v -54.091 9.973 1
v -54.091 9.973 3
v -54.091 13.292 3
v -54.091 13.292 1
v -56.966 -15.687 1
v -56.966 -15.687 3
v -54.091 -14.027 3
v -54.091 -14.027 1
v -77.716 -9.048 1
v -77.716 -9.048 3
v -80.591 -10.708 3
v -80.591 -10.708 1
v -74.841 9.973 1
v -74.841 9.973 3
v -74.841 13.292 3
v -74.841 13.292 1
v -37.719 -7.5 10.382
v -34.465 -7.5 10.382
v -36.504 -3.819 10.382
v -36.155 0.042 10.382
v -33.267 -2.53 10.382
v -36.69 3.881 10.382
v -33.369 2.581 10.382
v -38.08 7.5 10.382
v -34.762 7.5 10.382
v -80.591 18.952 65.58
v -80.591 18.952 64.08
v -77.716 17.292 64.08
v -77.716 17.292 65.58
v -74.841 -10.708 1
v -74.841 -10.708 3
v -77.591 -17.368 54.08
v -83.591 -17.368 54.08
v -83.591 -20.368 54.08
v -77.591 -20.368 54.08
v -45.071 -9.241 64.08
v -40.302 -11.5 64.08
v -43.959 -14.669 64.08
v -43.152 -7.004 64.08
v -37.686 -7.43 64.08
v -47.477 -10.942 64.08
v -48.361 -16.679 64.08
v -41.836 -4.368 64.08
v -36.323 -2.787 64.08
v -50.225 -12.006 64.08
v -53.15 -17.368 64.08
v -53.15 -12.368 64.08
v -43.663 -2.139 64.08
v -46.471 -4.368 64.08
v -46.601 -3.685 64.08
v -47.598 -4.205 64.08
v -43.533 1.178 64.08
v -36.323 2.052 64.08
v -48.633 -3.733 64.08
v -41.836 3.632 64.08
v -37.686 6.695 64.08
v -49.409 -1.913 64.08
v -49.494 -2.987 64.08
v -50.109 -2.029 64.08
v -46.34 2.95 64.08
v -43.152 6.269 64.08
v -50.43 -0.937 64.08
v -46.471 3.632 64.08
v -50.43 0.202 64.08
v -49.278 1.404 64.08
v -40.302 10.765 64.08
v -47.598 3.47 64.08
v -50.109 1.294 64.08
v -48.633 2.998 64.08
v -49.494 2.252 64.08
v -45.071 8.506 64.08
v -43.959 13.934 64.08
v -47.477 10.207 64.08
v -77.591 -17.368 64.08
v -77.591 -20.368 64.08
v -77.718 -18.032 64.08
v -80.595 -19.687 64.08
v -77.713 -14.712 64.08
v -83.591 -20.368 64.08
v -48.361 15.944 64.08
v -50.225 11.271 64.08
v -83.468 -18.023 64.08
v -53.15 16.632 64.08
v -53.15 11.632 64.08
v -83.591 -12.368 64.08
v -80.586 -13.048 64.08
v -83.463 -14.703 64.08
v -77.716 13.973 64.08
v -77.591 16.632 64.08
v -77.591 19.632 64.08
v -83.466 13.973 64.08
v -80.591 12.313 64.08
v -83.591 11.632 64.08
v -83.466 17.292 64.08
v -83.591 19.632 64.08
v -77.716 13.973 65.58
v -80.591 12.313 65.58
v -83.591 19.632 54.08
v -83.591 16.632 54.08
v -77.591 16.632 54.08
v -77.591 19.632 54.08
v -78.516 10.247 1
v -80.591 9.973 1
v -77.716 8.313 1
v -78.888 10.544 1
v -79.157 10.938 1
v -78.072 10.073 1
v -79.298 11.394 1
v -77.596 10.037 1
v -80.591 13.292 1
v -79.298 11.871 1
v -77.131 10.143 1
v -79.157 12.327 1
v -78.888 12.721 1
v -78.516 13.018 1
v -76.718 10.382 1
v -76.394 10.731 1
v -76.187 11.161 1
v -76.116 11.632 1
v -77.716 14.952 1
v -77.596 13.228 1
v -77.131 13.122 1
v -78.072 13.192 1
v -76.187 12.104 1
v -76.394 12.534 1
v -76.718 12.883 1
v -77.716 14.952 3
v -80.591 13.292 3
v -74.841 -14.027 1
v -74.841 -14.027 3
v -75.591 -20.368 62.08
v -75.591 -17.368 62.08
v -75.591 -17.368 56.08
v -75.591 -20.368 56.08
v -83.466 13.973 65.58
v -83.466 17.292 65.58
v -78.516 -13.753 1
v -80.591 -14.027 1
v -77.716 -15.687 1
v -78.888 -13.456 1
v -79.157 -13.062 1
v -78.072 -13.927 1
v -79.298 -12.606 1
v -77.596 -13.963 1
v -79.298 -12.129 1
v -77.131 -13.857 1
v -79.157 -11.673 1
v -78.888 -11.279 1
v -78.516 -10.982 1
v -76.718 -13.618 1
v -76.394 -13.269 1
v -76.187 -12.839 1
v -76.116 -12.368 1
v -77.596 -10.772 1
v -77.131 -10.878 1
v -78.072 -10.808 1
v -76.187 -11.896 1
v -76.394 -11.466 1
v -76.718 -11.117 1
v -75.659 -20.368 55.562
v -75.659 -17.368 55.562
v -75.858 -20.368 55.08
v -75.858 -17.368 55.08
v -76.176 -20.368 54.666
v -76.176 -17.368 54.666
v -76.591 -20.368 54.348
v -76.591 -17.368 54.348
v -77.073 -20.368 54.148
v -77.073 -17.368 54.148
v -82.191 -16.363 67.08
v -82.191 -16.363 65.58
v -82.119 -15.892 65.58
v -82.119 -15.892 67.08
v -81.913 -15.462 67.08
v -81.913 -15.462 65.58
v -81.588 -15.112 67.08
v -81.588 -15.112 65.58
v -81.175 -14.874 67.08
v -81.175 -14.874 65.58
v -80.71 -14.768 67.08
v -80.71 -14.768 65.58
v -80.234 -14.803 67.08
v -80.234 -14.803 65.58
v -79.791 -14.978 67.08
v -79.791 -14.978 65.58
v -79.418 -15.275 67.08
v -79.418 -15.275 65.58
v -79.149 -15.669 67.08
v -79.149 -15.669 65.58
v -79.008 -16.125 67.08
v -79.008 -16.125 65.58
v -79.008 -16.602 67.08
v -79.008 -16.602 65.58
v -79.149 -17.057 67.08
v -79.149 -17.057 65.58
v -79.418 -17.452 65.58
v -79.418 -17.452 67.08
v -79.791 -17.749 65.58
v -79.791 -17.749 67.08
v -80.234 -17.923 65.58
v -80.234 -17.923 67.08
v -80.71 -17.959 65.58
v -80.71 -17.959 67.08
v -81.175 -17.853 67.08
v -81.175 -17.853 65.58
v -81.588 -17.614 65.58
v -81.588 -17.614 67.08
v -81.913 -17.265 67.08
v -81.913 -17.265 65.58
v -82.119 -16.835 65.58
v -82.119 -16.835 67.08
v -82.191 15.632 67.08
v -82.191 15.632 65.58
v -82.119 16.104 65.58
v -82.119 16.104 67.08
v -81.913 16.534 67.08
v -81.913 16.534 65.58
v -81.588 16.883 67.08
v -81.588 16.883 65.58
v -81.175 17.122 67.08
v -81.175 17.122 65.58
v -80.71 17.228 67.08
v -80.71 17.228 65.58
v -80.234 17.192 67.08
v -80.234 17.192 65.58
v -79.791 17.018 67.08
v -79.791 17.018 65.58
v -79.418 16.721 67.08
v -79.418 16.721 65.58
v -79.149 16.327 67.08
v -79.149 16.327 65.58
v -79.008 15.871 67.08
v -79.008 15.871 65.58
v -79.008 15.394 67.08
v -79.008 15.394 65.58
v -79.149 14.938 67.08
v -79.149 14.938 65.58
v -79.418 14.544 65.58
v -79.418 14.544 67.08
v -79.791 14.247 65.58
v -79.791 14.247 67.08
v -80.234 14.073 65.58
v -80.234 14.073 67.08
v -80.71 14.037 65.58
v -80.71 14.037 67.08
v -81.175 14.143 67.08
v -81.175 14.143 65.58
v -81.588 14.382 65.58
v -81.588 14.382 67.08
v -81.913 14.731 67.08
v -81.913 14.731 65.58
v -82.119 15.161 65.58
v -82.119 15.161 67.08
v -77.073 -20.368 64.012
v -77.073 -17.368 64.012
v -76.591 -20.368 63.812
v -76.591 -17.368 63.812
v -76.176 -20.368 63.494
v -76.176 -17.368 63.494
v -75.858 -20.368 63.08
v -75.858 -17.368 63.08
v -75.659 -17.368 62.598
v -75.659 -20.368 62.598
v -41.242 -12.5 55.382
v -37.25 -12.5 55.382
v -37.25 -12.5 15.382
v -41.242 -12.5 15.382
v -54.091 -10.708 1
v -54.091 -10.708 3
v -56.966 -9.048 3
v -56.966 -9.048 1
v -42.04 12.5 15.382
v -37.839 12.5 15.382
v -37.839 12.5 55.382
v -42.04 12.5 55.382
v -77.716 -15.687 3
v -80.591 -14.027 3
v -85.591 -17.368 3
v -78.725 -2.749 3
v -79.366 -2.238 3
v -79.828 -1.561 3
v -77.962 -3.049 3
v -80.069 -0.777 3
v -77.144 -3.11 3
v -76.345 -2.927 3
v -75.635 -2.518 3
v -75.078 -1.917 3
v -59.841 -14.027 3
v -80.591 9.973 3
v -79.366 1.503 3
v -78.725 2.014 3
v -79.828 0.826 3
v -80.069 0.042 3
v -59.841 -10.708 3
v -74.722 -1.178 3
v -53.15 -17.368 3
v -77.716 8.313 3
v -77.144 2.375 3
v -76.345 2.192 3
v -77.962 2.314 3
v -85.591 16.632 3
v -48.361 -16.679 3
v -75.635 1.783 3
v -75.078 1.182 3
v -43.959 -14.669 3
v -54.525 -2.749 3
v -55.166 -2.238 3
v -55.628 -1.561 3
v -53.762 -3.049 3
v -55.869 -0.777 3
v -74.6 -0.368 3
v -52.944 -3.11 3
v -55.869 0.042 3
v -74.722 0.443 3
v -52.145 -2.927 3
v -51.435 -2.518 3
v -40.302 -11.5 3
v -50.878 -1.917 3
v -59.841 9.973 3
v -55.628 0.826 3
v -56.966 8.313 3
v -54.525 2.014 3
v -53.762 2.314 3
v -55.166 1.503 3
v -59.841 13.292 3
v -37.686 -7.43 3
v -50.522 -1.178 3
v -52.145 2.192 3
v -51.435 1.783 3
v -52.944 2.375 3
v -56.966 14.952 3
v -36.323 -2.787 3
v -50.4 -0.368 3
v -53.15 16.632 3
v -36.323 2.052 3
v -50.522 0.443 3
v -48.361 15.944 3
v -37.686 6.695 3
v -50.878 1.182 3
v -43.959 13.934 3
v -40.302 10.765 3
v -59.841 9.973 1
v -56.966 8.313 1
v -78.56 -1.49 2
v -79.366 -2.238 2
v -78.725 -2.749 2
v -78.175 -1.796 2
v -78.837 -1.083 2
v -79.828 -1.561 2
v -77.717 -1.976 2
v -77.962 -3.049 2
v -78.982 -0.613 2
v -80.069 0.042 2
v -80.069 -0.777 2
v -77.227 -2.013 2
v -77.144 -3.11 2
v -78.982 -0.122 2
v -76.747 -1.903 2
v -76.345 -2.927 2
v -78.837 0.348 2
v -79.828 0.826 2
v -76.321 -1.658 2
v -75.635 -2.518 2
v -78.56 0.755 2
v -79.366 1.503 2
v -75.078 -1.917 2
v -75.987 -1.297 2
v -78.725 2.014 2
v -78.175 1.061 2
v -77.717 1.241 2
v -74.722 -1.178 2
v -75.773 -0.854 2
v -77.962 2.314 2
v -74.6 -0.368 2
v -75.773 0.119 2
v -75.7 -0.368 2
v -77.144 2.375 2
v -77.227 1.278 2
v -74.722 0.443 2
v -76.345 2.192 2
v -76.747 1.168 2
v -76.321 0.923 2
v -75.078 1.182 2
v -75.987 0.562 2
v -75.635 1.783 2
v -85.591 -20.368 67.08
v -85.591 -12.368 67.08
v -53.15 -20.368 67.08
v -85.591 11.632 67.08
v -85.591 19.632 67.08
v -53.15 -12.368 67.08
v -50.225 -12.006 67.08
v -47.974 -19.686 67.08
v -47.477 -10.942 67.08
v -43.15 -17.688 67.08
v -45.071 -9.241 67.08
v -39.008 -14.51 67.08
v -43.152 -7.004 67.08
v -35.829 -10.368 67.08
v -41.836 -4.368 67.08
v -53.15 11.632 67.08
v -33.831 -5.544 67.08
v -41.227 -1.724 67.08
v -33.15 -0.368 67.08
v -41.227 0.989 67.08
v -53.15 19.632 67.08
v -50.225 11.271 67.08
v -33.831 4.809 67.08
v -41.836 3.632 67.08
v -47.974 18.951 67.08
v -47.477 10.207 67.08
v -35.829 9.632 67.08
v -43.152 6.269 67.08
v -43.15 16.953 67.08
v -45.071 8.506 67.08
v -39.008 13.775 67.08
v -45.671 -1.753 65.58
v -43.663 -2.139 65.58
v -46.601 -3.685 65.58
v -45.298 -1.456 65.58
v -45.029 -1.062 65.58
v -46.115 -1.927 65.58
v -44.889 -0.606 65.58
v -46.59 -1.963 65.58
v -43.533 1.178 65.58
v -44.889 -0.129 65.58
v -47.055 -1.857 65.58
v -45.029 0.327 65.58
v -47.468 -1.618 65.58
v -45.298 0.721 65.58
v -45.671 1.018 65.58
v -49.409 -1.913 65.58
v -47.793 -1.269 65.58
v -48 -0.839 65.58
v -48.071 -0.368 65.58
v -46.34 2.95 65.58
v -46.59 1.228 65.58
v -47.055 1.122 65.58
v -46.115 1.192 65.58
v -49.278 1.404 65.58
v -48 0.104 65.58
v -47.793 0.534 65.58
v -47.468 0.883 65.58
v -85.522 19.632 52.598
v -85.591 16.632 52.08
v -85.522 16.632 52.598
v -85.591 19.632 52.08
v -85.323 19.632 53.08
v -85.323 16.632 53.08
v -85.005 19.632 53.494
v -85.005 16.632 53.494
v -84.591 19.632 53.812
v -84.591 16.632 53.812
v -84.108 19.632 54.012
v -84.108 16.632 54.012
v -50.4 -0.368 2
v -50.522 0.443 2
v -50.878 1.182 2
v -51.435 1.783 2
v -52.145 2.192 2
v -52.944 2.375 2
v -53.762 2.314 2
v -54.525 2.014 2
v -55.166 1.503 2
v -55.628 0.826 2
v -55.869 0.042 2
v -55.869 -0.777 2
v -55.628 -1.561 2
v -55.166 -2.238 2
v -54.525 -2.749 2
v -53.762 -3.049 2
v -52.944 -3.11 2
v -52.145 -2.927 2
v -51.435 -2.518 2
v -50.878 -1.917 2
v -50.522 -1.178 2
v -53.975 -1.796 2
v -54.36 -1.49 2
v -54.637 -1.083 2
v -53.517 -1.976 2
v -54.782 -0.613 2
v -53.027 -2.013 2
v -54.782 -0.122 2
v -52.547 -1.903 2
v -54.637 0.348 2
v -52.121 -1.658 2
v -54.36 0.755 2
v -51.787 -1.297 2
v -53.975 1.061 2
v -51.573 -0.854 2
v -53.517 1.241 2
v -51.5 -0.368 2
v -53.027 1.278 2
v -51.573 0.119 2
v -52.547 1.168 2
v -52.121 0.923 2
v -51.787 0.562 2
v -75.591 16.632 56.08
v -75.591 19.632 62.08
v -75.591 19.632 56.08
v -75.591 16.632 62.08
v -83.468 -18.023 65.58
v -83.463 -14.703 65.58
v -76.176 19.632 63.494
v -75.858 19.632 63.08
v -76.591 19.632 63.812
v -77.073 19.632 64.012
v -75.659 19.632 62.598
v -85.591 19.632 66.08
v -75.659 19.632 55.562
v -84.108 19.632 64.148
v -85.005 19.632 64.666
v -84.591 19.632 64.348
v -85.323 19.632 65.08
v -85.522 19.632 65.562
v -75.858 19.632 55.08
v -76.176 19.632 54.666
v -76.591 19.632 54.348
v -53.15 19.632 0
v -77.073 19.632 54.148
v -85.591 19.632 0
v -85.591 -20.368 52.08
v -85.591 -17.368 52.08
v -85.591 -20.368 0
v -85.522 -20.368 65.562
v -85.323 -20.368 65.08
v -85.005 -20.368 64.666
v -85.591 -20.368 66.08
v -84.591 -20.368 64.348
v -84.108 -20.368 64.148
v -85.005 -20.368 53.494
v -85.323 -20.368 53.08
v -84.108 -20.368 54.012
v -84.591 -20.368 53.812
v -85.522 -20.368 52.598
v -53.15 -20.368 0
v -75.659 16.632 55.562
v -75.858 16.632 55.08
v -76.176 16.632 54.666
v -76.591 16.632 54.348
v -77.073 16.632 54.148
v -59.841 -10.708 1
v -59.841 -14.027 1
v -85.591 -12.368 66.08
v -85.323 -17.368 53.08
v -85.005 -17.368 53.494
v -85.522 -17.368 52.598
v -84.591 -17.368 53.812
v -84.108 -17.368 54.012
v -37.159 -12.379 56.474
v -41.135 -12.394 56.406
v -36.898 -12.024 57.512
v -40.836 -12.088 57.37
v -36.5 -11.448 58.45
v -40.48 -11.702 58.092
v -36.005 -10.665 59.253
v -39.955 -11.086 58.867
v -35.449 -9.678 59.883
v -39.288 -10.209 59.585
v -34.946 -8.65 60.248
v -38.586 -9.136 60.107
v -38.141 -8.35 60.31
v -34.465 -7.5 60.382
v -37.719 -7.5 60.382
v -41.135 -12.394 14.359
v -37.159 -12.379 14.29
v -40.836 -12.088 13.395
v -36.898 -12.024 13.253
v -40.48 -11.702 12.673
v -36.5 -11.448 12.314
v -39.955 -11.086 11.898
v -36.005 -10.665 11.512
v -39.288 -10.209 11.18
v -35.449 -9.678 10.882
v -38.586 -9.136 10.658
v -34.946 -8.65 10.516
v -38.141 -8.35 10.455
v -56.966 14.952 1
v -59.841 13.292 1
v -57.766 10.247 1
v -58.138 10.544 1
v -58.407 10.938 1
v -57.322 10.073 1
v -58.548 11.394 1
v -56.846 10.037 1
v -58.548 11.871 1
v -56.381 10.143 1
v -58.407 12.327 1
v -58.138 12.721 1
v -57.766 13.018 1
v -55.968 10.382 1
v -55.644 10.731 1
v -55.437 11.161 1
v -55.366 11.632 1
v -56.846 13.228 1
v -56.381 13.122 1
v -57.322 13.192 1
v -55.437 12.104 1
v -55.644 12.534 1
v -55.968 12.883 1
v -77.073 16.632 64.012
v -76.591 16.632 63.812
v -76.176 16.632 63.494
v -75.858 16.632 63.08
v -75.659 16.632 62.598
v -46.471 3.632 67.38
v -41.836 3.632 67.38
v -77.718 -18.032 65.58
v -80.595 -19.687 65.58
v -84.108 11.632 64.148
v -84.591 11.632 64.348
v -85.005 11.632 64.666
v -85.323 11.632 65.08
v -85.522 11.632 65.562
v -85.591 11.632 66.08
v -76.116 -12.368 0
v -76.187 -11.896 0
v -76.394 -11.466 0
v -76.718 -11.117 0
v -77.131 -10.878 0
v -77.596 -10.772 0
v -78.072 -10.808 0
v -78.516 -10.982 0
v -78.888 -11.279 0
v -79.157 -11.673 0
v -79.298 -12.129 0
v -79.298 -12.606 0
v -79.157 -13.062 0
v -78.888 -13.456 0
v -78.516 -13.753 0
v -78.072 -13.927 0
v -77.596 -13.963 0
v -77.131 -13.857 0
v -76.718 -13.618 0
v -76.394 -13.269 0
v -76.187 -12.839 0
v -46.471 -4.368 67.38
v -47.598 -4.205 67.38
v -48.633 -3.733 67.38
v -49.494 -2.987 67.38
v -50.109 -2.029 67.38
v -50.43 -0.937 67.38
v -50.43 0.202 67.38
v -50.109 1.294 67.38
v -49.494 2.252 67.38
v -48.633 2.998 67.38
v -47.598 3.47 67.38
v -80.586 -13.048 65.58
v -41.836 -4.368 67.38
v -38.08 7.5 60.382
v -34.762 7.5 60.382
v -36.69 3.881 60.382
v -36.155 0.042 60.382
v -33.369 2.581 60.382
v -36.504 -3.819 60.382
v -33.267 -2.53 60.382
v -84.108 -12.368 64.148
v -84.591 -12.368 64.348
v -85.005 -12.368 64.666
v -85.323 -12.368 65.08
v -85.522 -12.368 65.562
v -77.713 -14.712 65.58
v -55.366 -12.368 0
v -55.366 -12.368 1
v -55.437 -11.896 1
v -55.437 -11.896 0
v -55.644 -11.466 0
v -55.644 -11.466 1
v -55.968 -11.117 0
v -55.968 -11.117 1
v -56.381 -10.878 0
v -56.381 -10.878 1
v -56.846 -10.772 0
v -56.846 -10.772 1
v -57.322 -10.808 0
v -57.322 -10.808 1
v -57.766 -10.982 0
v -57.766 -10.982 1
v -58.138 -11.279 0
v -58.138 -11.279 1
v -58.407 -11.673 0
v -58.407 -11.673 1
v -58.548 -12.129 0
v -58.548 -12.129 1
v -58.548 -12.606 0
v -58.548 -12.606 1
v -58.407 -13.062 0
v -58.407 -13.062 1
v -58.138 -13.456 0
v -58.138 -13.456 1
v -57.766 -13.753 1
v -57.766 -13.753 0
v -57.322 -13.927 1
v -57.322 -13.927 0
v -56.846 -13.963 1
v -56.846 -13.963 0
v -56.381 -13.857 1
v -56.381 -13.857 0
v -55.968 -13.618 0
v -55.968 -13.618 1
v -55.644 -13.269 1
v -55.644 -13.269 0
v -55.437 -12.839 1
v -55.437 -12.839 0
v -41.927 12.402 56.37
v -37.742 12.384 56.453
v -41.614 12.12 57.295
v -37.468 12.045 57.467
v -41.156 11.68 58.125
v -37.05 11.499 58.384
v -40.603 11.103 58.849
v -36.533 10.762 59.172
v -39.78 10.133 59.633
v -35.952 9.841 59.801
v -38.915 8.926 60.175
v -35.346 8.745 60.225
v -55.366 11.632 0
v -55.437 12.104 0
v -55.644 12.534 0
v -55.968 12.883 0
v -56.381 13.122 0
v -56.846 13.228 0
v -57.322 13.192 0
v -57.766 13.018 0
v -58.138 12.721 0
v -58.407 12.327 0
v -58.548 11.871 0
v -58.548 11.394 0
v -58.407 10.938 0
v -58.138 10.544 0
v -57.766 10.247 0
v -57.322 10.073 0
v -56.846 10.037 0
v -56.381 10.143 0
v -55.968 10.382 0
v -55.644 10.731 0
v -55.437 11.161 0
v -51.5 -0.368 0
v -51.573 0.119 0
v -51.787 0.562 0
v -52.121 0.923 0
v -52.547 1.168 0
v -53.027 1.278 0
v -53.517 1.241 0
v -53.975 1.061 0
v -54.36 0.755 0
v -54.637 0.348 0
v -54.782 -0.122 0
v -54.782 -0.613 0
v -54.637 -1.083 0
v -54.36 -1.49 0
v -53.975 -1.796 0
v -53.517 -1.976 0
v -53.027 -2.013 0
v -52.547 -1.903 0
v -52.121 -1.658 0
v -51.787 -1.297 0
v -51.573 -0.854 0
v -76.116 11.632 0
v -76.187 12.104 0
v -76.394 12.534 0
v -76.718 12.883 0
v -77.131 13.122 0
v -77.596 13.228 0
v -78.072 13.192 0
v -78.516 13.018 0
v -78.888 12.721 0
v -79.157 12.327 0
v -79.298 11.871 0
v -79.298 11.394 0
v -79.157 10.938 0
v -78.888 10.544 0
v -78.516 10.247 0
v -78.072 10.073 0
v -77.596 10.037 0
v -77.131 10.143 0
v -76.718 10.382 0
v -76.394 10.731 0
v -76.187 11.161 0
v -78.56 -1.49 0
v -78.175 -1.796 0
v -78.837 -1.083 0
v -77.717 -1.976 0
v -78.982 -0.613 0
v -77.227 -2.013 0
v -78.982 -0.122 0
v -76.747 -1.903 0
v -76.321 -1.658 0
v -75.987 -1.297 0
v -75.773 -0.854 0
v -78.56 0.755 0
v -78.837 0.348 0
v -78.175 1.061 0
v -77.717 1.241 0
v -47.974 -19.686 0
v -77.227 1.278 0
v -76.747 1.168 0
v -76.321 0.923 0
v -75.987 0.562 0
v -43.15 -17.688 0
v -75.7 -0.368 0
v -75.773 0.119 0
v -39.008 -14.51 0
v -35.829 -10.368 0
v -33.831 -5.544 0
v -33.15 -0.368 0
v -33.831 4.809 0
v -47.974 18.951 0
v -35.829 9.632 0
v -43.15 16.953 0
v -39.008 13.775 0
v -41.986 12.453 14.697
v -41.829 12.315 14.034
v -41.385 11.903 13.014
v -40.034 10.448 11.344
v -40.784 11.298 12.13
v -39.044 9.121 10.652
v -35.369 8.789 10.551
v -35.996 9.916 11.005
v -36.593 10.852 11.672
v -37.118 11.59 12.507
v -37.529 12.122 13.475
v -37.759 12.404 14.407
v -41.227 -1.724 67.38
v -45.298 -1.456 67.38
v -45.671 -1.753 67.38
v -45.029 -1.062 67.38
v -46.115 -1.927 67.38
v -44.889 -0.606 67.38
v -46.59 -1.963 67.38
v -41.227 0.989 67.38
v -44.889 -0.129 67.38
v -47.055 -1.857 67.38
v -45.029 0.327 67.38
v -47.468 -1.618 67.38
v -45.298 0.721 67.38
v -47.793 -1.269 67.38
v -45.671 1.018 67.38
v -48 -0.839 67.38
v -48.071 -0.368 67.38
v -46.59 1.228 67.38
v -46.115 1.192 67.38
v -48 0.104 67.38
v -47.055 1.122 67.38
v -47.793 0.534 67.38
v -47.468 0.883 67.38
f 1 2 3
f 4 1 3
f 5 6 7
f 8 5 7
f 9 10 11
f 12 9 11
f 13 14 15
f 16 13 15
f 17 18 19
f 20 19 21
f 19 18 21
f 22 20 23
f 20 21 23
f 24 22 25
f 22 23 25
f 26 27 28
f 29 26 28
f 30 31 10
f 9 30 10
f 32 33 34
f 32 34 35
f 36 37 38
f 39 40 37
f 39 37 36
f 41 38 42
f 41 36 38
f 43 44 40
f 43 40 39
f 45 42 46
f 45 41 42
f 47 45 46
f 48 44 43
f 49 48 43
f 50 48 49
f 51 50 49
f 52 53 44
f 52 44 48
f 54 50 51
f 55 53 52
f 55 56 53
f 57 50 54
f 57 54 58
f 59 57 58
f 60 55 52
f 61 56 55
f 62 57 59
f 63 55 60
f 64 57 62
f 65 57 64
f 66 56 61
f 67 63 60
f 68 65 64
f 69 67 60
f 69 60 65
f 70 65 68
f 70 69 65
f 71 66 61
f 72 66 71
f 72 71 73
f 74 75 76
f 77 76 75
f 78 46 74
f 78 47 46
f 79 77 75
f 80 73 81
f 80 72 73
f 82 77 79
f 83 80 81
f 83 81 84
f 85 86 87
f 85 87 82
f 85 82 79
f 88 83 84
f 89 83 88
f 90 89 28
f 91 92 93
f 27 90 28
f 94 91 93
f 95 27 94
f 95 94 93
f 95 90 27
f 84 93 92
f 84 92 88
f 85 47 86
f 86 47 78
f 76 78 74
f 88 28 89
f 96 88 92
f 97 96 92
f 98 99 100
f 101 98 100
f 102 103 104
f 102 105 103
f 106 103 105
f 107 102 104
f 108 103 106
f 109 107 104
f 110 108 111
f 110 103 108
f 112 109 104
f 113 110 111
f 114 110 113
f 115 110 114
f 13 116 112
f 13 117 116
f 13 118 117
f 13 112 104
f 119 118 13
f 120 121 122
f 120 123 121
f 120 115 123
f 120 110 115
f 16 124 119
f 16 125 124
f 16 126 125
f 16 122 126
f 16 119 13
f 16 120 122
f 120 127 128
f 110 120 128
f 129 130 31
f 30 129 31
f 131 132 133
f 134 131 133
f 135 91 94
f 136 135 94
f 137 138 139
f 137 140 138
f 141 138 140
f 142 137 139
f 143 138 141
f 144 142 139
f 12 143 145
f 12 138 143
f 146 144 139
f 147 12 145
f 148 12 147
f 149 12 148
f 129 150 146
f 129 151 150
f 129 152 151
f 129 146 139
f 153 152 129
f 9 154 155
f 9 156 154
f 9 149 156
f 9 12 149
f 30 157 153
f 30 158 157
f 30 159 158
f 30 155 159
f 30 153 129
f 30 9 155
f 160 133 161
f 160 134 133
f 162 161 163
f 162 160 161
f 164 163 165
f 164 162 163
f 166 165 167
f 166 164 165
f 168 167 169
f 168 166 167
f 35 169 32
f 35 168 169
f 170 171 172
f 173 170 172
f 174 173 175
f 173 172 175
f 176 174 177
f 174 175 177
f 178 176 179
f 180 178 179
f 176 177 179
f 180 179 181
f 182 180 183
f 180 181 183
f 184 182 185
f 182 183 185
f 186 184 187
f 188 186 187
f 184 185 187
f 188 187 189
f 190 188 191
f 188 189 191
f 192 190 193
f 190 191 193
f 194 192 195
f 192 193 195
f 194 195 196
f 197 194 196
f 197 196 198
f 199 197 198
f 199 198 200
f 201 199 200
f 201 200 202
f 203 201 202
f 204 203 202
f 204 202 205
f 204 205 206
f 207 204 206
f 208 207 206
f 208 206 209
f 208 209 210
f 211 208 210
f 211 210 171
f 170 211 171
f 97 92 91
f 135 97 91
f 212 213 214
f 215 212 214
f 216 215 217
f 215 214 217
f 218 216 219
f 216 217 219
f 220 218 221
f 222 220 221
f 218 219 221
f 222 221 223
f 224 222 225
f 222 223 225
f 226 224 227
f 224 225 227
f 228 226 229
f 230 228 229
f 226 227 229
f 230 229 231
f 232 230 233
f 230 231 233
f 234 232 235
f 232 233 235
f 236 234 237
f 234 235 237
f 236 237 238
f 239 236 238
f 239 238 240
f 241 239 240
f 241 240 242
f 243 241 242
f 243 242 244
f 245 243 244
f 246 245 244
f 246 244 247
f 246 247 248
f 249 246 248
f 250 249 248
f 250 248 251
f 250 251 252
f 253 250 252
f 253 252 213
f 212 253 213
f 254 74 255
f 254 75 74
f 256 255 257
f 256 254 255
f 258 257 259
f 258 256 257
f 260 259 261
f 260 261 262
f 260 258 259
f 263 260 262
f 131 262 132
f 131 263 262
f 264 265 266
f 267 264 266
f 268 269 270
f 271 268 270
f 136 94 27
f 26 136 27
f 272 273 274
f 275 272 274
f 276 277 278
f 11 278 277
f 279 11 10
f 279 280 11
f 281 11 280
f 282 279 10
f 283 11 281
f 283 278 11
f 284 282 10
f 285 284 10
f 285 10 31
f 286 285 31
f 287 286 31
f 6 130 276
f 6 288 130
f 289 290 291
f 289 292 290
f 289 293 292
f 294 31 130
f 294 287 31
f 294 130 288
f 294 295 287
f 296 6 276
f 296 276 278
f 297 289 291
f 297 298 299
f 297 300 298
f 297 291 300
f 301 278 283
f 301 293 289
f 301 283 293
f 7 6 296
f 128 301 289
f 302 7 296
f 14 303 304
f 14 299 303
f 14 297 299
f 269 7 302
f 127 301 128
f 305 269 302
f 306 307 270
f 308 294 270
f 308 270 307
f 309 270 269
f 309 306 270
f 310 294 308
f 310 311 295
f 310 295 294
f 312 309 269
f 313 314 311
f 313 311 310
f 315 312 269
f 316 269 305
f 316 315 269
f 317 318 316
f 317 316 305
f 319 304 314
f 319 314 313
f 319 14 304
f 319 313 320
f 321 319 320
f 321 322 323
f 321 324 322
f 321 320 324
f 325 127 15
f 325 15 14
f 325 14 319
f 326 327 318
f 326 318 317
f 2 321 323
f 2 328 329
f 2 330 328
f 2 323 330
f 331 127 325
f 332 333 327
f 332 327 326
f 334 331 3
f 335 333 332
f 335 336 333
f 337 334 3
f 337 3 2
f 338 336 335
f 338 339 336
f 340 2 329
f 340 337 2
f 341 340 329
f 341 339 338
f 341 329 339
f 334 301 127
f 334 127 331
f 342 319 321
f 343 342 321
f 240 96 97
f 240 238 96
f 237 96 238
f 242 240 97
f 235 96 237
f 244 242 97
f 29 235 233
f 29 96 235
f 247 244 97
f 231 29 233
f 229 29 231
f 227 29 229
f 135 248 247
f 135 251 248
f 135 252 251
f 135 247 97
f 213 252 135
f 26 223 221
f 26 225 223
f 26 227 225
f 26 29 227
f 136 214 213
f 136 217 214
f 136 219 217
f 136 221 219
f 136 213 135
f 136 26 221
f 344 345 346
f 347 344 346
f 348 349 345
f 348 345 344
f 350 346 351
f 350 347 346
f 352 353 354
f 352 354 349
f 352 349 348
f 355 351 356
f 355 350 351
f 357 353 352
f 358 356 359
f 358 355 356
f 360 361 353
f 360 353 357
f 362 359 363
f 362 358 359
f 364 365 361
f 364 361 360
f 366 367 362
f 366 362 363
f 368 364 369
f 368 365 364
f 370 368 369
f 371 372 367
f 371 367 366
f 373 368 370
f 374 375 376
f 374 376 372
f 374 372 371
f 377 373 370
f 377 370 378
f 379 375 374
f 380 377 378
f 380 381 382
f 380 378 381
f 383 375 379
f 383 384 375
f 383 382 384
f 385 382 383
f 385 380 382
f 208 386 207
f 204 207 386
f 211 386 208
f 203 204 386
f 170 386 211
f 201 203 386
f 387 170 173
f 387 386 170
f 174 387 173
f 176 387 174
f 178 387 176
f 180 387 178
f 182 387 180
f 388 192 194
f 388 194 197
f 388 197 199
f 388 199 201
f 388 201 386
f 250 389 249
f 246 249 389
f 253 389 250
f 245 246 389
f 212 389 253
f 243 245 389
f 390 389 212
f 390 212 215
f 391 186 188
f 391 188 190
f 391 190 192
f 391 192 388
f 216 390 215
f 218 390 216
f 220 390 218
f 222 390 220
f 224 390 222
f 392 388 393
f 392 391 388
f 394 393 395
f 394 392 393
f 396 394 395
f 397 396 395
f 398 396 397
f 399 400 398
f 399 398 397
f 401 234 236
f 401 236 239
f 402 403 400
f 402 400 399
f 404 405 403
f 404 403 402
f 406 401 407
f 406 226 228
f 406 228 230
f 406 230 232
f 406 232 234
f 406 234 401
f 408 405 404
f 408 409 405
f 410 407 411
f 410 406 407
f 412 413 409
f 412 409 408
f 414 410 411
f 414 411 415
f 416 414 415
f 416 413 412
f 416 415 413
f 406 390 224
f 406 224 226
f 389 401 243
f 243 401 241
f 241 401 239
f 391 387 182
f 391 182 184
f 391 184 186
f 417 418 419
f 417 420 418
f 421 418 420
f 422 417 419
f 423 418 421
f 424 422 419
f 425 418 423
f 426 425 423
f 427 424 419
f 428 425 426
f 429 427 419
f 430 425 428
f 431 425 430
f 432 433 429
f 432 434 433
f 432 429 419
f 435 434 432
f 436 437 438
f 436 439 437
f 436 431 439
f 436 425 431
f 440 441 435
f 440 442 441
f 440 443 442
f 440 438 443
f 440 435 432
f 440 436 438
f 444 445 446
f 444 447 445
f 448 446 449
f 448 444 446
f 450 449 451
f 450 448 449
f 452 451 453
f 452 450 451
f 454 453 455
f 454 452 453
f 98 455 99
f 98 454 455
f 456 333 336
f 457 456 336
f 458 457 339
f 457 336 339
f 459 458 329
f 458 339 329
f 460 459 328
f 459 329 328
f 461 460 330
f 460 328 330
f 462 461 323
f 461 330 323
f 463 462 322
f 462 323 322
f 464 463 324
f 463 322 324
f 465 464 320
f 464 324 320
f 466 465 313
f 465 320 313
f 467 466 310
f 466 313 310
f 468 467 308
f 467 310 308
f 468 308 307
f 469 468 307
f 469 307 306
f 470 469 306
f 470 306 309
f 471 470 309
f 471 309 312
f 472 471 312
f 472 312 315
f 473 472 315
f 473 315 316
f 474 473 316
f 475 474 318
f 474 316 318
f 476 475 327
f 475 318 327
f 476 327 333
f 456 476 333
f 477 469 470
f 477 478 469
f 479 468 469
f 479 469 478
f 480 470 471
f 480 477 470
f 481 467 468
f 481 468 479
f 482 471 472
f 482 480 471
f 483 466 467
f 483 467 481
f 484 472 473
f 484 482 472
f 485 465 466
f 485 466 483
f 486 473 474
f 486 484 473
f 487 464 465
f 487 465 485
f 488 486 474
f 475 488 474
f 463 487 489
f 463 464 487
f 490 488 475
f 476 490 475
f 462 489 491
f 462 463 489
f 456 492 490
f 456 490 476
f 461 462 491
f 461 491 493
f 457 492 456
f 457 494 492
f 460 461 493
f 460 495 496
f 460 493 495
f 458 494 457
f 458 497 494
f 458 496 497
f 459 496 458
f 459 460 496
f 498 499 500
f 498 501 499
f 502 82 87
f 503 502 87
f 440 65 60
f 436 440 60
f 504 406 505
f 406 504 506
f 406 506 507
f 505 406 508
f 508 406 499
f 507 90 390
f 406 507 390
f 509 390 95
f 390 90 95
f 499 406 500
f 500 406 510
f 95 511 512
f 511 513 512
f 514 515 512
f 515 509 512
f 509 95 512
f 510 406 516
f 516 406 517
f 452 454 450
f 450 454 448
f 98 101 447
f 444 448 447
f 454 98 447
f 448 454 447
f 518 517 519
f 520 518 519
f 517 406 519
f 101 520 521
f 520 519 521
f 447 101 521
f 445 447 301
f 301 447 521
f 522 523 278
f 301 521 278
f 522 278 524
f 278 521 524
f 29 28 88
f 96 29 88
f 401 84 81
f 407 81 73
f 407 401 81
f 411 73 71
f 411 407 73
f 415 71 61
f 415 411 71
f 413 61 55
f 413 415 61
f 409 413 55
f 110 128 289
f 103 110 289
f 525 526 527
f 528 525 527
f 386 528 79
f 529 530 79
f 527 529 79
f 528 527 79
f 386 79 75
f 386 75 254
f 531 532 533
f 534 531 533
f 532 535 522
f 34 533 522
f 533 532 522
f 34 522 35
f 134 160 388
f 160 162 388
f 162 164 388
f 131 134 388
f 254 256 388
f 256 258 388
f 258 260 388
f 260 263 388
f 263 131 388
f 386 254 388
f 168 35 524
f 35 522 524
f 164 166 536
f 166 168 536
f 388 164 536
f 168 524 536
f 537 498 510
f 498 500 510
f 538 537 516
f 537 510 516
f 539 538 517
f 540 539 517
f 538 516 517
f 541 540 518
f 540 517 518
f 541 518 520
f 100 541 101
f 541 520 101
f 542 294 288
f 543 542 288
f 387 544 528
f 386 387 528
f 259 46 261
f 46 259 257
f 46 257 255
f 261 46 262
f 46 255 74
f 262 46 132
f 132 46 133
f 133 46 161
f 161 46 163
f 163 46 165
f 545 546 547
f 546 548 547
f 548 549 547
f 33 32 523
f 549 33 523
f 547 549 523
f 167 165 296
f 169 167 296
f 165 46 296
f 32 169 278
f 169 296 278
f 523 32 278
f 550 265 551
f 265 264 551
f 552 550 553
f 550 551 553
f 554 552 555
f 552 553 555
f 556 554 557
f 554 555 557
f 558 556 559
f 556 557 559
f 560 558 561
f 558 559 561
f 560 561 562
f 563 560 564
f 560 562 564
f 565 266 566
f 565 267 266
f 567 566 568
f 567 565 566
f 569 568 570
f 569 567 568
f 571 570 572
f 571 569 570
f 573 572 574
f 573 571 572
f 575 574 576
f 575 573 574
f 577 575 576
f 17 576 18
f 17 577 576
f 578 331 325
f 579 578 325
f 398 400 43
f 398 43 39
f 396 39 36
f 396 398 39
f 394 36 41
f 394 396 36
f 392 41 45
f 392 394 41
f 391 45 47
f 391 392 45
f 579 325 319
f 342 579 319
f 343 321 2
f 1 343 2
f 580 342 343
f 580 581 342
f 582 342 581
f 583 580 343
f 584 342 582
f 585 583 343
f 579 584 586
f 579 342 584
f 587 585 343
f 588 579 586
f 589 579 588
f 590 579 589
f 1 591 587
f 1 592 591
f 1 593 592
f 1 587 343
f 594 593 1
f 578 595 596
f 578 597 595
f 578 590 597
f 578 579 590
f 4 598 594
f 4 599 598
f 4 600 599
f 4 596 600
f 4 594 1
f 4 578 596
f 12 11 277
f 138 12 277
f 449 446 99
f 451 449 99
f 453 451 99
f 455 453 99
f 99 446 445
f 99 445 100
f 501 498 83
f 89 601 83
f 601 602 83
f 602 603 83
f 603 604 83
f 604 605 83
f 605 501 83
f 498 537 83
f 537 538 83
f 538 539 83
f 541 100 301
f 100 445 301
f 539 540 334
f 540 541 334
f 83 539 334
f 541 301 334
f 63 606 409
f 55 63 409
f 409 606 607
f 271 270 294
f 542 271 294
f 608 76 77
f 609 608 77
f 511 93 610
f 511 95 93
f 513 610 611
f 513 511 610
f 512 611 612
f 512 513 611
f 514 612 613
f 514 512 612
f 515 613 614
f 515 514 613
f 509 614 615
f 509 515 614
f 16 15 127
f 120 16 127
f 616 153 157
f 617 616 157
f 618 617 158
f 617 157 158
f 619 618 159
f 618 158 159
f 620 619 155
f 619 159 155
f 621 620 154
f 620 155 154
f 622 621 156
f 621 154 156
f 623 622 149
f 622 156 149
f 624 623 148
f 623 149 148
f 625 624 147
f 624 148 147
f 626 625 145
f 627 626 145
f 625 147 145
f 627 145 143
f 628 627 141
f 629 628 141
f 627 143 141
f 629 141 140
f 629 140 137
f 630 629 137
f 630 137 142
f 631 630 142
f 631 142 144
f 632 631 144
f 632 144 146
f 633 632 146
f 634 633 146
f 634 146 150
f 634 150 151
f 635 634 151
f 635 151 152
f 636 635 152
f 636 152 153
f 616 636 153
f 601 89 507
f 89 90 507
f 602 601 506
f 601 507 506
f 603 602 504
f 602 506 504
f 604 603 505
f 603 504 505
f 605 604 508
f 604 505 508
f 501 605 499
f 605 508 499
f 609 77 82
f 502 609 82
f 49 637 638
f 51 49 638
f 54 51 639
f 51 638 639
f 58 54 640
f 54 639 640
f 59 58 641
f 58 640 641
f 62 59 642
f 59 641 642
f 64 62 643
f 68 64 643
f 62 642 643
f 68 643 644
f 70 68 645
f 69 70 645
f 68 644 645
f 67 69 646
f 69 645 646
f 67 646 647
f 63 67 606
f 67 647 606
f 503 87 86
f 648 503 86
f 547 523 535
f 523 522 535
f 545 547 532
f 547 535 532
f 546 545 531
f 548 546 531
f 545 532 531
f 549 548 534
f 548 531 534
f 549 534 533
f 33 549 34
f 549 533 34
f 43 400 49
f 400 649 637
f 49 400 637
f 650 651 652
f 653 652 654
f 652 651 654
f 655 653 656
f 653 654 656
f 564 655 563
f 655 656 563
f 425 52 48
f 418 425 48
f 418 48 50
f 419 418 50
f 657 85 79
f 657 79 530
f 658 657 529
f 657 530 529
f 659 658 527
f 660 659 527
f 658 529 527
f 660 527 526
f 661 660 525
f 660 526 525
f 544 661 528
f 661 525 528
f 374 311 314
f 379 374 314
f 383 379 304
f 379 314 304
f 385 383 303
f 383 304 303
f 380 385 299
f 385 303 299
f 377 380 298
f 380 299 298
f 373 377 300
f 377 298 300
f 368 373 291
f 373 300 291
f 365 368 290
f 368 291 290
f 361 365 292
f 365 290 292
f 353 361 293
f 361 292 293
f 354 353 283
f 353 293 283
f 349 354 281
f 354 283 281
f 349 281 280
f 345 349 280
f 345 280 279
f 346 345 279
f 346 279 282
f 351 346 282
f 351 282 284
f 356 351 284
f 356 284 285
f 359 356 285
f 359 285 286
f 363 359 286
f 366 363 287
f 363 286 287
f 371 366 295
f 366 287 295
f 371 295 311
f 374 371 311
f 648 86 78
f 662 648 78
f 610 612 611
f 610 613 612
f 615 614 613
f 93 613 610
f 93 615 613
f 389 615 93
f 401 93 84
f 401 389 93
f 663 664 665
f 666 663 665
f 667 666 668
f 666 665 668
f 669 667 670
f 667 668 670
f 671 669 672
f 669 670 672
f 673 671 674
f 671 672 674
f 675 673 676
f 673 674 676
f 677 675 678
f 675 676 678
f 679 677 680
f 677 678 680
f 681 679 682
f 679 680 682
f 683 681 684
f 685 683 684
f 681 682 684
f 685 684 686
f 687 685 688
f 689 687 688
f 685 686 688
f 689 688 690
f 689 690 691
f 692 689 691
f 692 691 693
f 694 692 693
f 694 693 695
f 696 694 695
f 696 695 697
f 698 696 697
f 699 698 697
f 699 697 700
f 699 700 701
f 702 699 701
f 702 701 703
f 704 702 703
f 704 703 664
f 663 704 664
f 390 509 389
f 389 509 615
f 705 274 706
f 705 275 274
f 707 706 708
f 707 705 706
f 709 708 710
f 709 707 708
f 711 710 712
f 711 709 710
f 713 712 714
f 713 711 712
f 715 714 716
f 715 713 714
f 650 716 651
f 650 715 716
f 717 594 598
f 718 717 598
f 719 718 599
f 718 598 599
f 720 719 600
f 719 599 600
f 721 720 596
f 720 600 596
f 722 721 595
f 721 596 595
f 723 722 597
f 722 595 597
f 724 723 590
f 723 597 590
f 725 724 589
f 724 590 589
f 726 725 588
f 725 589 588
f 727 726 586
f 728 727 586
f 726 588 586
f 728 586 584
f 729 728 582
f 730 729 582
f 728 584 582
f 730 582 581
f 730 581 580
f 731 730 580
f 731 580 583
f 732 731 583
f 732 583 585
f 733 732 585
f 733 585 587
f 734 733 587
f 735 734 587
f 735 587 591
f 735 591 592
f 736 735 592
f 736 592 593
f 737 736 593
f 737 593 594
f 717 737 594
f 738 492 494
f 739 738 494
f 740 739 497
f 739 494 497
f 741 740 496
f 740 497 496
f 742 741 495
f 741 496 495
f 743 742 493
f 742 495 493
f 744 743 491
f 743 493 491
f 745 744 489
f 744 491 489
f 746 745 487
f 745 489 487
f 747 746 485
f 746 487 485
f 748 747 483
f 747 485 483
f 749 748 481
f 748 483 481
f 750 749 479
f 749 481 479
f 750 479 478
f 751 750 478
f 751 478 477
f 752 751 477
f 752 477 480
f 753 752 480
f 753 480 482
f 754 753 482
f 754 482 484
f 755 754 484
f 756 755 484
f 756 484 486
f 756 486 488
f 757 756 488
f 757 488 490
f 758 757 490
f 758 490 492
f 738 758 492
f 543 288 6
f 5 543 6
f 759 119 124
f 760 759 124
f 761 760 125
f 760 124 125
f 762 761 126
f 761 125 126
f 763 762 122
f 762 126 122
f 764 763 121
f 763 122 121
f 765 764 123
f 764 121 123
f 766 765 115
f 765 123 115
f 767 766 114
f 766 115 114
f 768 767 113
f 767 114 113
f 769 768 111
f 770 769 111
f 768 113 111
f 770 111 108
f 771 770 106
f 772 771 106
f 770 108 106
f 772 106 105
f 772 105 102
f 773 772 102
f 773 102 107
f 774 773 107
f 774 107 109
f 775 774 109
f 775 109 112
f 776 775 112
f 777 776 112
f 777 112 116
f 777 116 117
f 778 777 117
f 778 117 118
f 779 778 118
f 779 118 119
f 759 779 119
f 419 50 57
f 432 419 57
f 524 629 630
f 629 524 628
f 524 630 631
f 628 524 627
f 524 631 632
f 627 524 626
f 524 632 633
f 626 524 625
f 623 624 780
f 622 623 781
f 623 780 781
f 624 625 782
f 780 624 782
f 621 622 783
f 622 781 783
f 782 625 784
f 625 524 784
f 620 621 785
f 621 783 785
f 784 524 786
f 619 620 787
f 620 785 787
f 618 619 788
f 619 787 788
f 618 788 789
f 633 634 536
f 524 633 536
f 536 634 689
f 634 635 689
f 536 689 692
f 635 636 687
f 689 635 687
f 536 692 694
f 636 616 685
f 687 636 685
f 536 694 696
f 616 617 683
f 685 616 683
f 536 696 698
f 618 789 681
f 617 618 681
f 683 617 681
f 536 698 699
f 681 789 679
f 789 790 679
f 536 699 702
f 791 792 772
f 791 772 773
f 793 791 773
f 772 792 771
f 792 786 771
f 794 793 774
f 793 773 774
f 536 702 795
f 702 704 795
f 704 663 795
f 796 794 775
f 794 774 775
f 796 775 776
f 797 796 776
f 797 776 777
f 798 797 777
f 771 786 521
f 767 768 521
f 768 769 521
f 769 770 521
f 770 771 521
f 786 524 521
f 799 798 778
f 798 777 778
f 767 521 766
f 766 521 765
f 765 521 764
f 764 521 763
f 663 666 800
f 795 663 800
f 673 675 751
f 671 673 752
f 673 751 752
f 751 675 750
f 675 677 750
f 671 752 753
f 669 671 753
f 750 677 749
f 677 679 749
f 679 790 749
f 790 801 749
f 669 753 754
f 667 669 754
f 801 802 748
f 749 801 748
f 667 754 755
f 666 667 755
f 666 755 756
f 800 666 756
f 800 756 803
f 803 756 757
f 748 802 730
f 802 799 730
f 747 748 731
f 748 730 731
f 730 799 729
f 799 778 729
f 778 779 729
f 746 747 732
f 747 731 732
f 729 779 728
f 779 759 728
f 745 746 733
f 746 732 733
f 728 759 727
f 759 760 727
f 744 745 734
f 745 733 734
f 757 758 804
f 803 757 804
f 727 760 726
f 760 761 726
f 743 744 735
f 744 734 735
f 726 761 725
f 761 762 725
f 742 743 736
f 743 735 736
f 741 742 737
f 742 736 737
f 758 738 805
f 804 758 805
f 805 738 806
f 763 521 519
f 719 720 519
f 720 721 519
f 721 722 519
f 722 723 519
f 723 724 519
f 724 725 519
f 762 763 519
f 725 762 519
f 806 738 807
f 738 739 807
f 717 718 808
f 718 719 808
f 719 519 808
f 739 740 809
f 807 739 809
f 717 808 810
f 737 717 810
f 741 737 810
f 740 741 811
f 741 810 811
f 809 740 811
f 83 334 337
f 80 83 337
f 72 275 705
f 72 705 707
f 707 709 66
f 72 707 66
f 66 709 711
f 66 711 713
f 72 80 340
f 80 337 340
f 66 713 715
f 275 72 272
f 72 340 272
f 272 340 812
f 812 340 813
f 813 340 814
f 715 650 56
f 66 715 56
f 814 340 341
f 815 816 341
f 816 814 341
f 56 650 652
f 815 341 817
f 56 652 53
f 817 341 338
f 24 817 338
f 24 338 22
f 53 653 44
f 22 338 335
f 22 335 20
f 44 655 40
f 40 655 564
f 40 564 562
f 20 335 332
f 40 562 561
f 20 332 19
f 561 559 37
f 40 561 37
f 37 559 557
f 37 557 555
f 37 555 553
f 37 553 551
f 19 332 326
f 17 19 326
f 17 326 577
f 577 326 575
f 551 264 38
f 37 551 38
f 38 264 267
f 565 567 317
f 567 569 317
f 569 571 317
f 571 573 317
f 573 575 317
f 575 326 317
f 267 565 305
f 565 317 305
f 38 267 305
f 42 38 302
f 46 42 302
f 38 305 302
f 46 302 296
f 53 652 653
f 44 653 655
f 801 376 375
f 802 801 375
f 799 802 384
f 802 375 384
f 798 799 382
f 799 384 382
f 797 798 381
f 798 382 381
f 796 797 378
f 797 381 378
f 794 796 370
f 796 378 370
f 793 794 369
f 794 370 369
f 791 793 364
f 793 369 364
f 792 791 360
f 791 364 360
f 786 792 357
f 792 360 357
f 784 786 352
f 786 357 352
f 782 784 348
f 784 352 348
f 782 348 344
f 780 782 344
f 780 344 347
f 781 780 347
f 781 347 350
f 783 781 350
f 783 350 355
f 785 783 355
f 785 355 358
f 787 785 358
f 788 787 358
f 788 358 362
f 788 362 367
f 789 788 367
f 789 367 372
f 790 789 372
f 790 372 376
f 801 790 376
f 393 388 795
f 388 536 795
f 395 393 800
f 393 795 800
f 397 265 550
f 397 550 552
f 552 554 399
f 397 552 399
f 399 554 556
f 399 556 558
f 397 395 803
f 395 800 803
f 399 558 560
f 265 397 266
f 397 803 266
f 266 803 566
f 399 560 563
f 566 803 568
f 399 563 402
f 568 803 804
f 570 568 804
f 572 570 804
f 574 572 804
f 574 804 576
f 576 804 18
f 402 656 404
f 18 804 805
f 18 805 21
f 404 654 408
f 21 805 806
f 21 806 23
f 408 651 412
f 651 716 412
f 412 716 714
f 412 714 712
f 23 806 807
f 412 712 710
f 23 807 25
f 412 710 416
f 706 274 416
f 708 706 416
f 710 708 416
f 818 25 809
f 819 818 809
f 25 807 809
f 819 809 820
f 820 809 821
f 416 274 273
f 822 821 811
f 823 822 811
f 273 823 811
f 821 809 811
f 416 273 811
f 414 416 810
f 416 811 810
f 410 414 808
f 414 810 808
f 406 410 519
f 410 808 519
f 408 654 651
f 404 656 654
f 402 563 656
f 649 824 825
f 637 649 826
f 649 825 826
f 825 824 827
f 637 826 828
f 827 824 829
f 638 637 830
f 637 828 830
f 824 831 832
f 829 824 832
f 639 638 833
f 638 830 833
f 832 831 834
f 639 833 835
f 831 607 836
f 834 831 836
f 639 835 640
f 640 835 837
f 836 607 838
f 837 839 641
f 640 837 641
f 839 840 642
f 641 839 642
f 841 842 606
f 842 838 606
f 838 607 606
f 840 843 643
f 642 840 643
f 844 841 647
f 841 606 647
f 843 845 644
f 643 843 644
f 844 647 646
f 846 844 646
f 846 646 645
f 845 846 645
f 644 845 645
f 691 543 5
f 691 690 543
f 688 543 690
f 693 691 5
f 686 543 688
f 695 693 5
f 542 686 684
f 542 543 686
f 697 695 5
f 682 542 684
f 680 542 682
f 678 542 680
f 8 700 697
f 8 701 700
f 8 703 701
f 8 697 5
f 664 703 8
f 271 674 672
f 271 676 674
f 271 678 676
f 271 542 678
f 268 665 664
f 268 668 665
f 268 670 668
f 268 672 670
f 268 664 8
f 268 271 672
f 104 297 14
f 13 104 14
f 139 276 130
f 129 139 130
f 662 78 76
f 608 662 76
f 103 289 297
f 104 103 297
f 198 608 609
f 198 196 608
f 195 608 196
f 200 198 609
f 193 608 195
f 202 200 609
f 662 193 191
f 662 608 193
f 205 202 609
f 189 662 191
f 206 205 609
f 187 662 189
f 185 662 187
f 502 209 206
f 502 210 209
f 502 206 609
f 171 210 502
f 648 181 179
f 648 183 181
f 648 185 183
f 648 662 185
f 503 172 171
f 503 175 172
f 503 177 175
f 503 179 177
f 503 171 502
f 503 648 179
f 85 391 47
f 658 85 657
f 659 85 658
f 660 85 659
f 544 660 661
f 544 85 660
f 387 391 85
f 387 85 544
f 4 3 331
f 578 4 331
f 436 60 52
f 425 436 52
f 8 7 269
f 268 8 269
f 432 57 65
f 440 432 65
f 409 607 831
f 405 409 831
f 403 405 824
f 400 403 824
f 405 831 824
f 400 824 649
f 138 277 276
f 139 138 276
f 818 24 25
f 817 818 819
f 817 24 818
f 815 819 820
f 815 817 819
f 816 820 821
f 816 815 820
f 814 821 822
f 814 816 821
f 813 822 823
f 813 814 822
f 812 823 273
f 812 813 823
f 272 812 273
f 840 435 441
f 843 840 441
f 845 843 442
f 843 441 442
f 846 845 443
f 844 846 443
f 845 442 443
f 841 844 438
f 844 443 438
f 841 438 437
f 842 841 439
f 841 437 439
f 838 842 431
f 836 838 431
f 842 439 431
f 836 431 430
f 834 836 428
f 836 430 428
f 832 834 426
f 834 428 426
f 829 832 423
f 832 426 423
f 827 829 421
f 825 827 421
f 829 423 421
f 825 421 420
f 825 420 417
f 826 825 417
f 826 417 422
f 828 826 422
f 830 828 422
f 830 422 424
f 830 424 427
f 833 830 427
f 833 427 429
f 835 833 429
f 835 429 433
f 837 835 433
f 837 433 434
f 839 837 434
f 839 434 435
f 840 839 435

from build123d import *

# Parameters (mm, degrees)
BOSS_EXTRUDE1_DEPTH     = 3
BOSS_EXTRUDE2_DEPTH     = 64.08
BOSS_EXTRUDE3_START     = 0.3
BOSS_EXTRUDE3_DEPTH     = 3
CUT_EXTRUDE1_REACH      = 5
SKETCH4_R               = 1.65
CUT_EXTRUDE2_DEPTH      = 2
CUT_EXTRUDE3_REACH      = 5
SKETCH7_R               = 1.6
SKETCH10_W              = 10
SKETCH10_H              = 10
CUT_EXTRUDE4_DEPTH      = 38
CUT_EXTRUDE4_DEPTH_BACK = 4
CUT_EXTRUDE6_DEPTH      = 1.5
CUT_EXTRUDE7_REACH      = 5
SKETCH12_R              = 1.6
CUT_EXTRUDE8_REACH      = 87.591
BOSS_EXTRUDE4_DEPTH     = 3.3
CUT_EXTRUDE9_REACH      = 5.3
SKETCH15_R              = 1.6
CUT_EXTRUDE10_DEPTH     = 1.5
SKETCH17_R              = 8
CUT_EXTRUDE11_DEPTH     = 1
SKETCH18_R              = 2.75
CUT_EXTRUDE13_DEPTH     = 1
FILLET1_R               = 2
FILLET2_R               = 5


with BuildPart() as part:
    # Sketch1 → Boss-Extrude1 (new body)
    with BuildSketch(Plane.XY):
        with BuildLine():
            Line((-85.590530374, -20.367507575), (-53.15, -20.367507575))
            ThreePointArc((-53.15, -20.367507575), (-33.15, -0.367507575), (-53.15, 19.632492425))
            Line((-53.15, 19.632492425), (-85.590530374, 19.632492425))
            Line((-85.590530374, 19.632492425), (-85.590530374, -20.367507575))
        make_face()
    extrude(amount=BOSS_EXTRUDE1_DEPTH)

    # Sketch2 → Boss-Extrude2 (add)
    with BuildSketch(Plane.XY.offset(3)):
        with BuildLine():
            Line((-85.590530374, -20.367507575), (-53.15, -20.367507575))
            ThreePointArc((-53.15, -20.367507575), (-33.15, -0.367507575), (-53.15, 19.632492425))
            Line((-53.15, 19.632492425), (-85.590530374, 19.632492425))
            Line((-85.590530374, 19.632492425), (-85.590530374, 16.632492425))
            Line((-85.590530374, 16.632492425), (-53.15, 16.632492425))
            ThreePointArc((-53.15, 16.632492425), (-36.15, -0.367507575), (-53.15, -17.367507575))
            Line((-53.15, -17.367507575), (-85.590530374, -17.367507575))
            Line((-85.590530374, -17.367507575), (-85.590530374, -20.367507575))
        make_face()
    extrude(amount=BOSS_EXTRUDE2_DEPTH)

    # Sketch3 → Boss-Extrude3 (add)
    with BuildSketch(Plane(origin=(0, 0, 67.38), x_dir=(-1, 0, 0), z_dir=(0, 0, -1)).offset(BOSS_EXTRUDE3_START)):
        with BuildLine():
            Line((85.590530374, 19.632492425), (85.590530374, 11.632492425))
            Line((85.590530374, 11.632492425), (77.590530374, 11.632492425))
            Line((77.590530374, 11.632492425), (53.15, 11.632492425))
            ThreePointArc((53.15, 11.632492425), (41.15, -0.367507575), (53.15, -12.367507575))
            Line((53.15, -12.367507575), (77.590530374, -12.367507575))
            Line((77.590530374, -12.367507575), (85.590530374, -12.367507575))
            Line((85.590530374, -12.367507575), (85.590530374, -20.367507575))
            Line((85.590530374, -20.367507575), (53.15, -20.367507575))
            ThreePointArc((53.15, -20.367507575), (33.15, -0.367507575), (53.15, 19.632492425))
            Line((53.15, 19.632492425), (85.590530374, 19.632492425))
        make_face()
    extrude(amount=BOSS_EXTRUDE3_DEPTH)

    # Sketch4 → Cut-Extrude1 (cut, up to next)
    with BuildSketch(Plane.XY.offset(3), mode=Mode.PRIVATE) as cut_extrude1_sk1:
        with Locations((-77.35, -0.367507575)):
            Circle(SKETCH4_R)
    cut_extrude1_tool1 = extrude(cut_extrude1_sk1.sketch, amount=-CUT_EXTRUDE1_REACH, mode=Mode.PRIVATE) & part.part
    add(cut_extrude1_tool1.solids().sort_by_distance((-77.35, -0.367508, 3))[0], mode=Mode.SUBTRACT)
    # Sketch4 → Cut-Extrude1 (cut, up to next)
    with BuildSketch(Plane.XY.offset(3), mode=Mode.PRIVATE) as cut_extrude1_sk2:
        with Locations((-53.15, -0.367507575)):
            Circle(SKETCH4_R)
    cut_extrude1_tool2 = extrude(cut_extrude1_sk2.sketch, amount=-CUT_EXTRUDE1_REACH, mode=Mode.PRIVATE) & part.part
    add(cut_extrude1_tool2.solids().sort_by_distance((-53.15, -0.367508, 3))[0], mode=Mode.SUBTRACT)

    # Sketch6 → Cut-Extrude2 (cut)
    with BuildSketch(Plane.XY.offset(3)):
        Polygon((-77.715530374, -9.047743527), (-80.590530374, -10.707625551), (-80.590530374, -14.027389599), (-77.715530374, -15.687271623), (-74.840530374, -14.027389599), (-74.840530374, -10.707625551), align=None)
        Polygon((-56.965530374, -9.047743527), (-59.840530374, -10.707625551), (-59.840530374, -14.027389599), (-56.965530374, -15.687271623), (-54.090530374, -14.027389599), (-54.090530374, -10.707625551), align=None)
        Polygon((-77.715530374, 14.952256473), (-80.590530374, 13.292374449), (-80.590530374, 9.972610401), (-77.715530374, 8.312728377), (-74.840530374, 9.972610401), (-74.840530374, 13.292374449), align=None)
        Polygon((-56.965530374, 14.952256473), (-59.840530374, 13.292374449), (-59.840530374, 9.972610401), (-56.965530374, 8.312728377), (-54.090530374, 9.972610401), (-54.090530374, 13.292374449), align=None)
    extrude(amount=-CUT_EXTRUDE2_DEPTH, mode=Mode.SUBTRACT)

    # Sketch7 → Cut-Extrude3 (cut, up to next)
    with BuildSketch(Plane.XY.offset(3), mode=Mode.PRIVATE) as cut_extrude3_sk1:
        with Locations((-77.715530374, -12.367507575)):
            Circle(SKETCH7_R)
    cut_extrude3_tool1 = extrude(cut_extrude3_sk1.sketch, amount=-CUT_EXTRUDE3_REACH, mode=Mode.PRIVATE) & part.part
    add(cut_extrude3_tool1.solids().sort_by_distance((-77.71553, -12.367508, 3))[0], mode=Mode.SUBTRACT)
    # Sketch7 → Cut-Extrude3 (cut, up to next)
    with BuildSketch(Plane.XY.offset(3), mode=Mode.PRIVATE) as cut_extrude3_sk2:
        with Locations((-77.715530374, 11.632492425)):
            Circle(SKETCH7_R)
    cut_extrude3_tool2 = extrude(cut_extrude3_sk2.sketch, amount=-CUT_EXTRUDE3_REACH, mode=Mode.PRIVATE) & part.part
    add(cut_extrude3_tool2.solids().sort_by_distance((-77.71553, 11.632492, 3))[0], mode=Mode.SUBTRACT)
    # Sketch7 → Cut-Extrude3 (cut, up to next)
    with BuildSketch(Plane.XY.offset(3), mode=Mode.PRIVATE) as cut_extrude3_sk3:
        with Locations((-56.965530374, 11.632492425)):
            Circle(SKETCH7_R)
    cut_extrude3_tool3 = extrude(cut_extrude3_sk3.sketch, amount=-CUT_EXTRUDE3_REACH, mode=Mode.PRIVATE) & part.part
    add(cut_extrude3_tool3.solids().sort_by_distance((-56.96553, 11.632492, 3))[0], mode=Mode.SUBTRACT)
    # Sketch7 → Cut-Extrude3 (cut, up to next)
    with BuildSketch(Plane.XY.offset(3), mode=Mode.PRIVATE) as cut_extrude3_sk4:
        with Locations((-56.965530374, -12.367507575)):
            Circle(SKETCH7_R)
    cut_extrude3_tool4 = extrude(cut_extrude3_sk4.sketch, amount=-CUT_EXTRUDE3_REACH, mode=Mode.PRIVATE) & part.part
    add(cut_extrude3_tool4.solids().sort_by_distance((-56.96553, -12.367508, 3))[0], mode=Mode.SUBTRACT)

    # Sketch10 → Cut-Extrude4 (cut, two sides)
    with BuildSketch(Plane(origin=(0, -17.367507575, 0), x_dir=(1, 0, 0), z_dir=(0, 1, 0))) as cut_extrude4_sk:
        with Locations((-80.590530374, -59.08)):
            Rectangle(SKETCH10_W, SKETCH10_H)
    extrude(amount=CUT_EXTRUDE4_DEPTH, mode=Mode.SUBTRACT)
    extrude(cut_extrude4_sk.sketch, amount=-CUT_EXTRUDE4_DEPTH_BACK, mode=Mode.SUBTRACT)

    # Sketch11 → Cut-Extrude6 (cut)
    with BuildSketch(Plane(origin=(0, 0, 64.08), x_dir=(-1, 0, 0), z_dir=(0, 0, -1))):
        Polygon((80.590530374, 12.312728377), (83.465530374, 13.972610401), (83.465530374, 17.292374449), (80.590530374, 18.952256473), (77.715530374, 17.292374449), (77.715530374, 13.972610401), align=None)
        Polygon((80.595461682, -19.68726796), (83.467992856, -18.02311713), (83.463061548, -14.703356745), (80.585599066, -13.04774719), (77.713067892, -14.71189802), (77.7179992, -18.031658405), align=None)
    extrude(amount=-CUT_EXTRUDE6_DEPTH, mode=Mode.SUBTRACT)

    # Sketch12 → Cut-Extrude7 (cut, up to next)
    with BuildSketch(Plane(origin=(0, 0, 64.08), x_dir=(-1, 0, 0), z_dir=(0, 0, -1)), mode=Mode.PRIVATE) as cut_extrude7_sk1:
        with Locations((80.590530374, 15.632492425)):
            Circle(SKETCH12_R)
    cut_extrude7_tool1 = extrude(cut_extrude7_sk1.sketch, amount=-CUT_EXTRUDE7_REACH, mode=Mode.PRIVATE) & part.part
    add(cut_extrude7_tool1.solids().sort_by_distance((-80.59053, 15.632492, 64.08))[0], mode=Mode.SUBTRACT)
    # Sketch12 → Cut-Extrude7 (cut, up to next)
    with BuildSketch(Plane(origin=(0, 0, 64.08), x_dir=(-1, 0, 0), z_dir=(0, 0, -1)), mode=Mode.PRIVATE) as cut_extrude7_sk2:
        with Locations((80.590530374, -16.363236937)):
            Circle(SKETCH12_R)
    cut_extrude7_tool2 = extrude(cut_extrude7_sk2.sketch, amount=-CUT_EXTRUDE7_REACH, mode=Mode.PRIVATE) & part.part
    add(cut_extrude7_tool2.solids().sort_by_distance((-80.59053, -16.363237, 64.08))[0], mode=Mode.SUBTRACT)

    # Sketch13 → Cut-Extrude8 (cut, up to next)
    with BuildSketch(Plane(origin=(0, 0, 0), x_dir=(0, 0, -1), z_dir=(1, 0, 0)), mode=Mode.PRIVATE) as cut_extrude8_sk1:
        Polygon((-60.382396062, 0), (-60.382396062, -12.5), (-10.382396062, -12.5), (-10.382396062, 12.5), (-60.382396062, 12.5), align=None)
    cut_extrude8_tool1 = extrude(cut_extrude8_sk1.sketch, amount=-CUT_EXTRUDE8_REACH, mode=Mode.PRIVATE) & part.part
    add(cut_extrude8_tool1.solids().sort_by_distance((0, 0, 35.382396))[0], mode=Mode.SUBTRACT)

    # Sketch14 → Boss-Extrude4 (add)
    with BuildSketch(Plane(origin=(0, 0, 67.38), x_dir=(-1, 0, 0), z_dir=(0, 0, -1))):
        with BuildLine():
            Line((46.470700294, 3.632492425), (41.836291501, 3.632492425))
            ThreePointArc((41.836291501, 3.632492425), (41.149999808, -0.367507575), (41.836291501, -4.367507575))
            Line((41.836291501, -4.367507575), (46.470700294, -4.367507575))
            ThreePointArc((46.470700294, -4.367507575), (50.470700294, -0.367507575), (46.470700294, 3.632492425))
        make_face()
    extrude(amount=BOSS_EXTRUDE4_DEPTH)

    # Sketch15 → Cut-Extrude9 (cut, up to next)
    with BuildSketch(Plane(origin=(0, 0, 64.08), x_dir=(-1, 0, 0), z_dir=(0, 0, -1)), mode=Mode.PRIVATE) as cut_extrude9_sk1:
        with Locations((46.470700294, -0.367507575)):
            Circle(SKETCH15_R)
    cut_extrude9_tool1 = extrude(cut_extrude9_sk1.sketch, amount=-CUT_EXTRUDE9_REACH, mode=Mode.PRIVATE) & part.part
    add(cut_extrude9_tool1.solids().sort_by_distance((-46.4707, -0.367508, 64.08))[0], mode=Mode.SUBTRACT)

    # Sketch16 → Cut-Extrude10 (cut)
    with BuildSketch(Plane(origin=(0, 0, 64.08), x_dir=(-1, 0, 0), z_dir=(0, 0, -1))):
        Polygon((46.601103516, -3.684709458), (49.408683005, -1.913176014), (49.278279783, 1.40402587), (46.340297072, 2.949694308), (43.532717583, 1.178160864), (43.663120805, -2.139041019), align=None)
    extrude(amount=-CUT_EXTRUDE10_DEPTH, mode=Mode.SUBTRACT)

    # Sketch17 → Cut-Extrude11 (cut)
    with BuildSketch(Plane.XY.offset(3)):
        with Locations((-349.65, -0.367507575)):
            Circle(SKETCH17_R)
    extrude(amount=-CUT_EXTRUDE11_DEPTH, mode=Mode.SUBTRACT)

    # Sketch18 → Cut-Extrude13 (cut)
    with BuildSketch(Plane.XY.offset(3)):
        with Locations((-53.15, -0.367507575)):
            Circle(SKETCH18_R)
        with Locations((-77.35, -0.367507575)):
            Circle(SKETCH18_R)
    extrude(amount=-CUT_EXTRUDE13_DEPTH, mode=Mode.SUBTRACT)

    # Fillet1
    fillet1_edges = [part.edges().sort_by_distance(p)[0] for p in [
        (-85.590530374, 18.132492425, 54.08),
        (-85.590530374, -18.867507575, 54.08),
        (-75.590530374, 18.132492425, 54.08),
        (-75.590530374, -18.867507575, 54.08),
        (-75.590530374, 18.132492425, 64.08),
        (-75.590530374, -18.867507575, 64.08),
        (-85.590530374, 15.632492425, 64.08),
        (-85.590530374, -16.367507575, 64.08),
    ]]
    fillet(fillet1_edges, radius=FILLET1_R)

    # Fillet2
    fillet2_edges = [part.edges().sort_by_distance(p)[0] for p in [
        (-39.939600546, 12.5, 60.382396062),
        (-39.939600546, 12.5, 10.382396062),
        (-39.246070498, -12.5, 10.382396062),
        (-39.246070498, -12.5, 60.382396062),
    ]]
    fillet(fillet2_edges, radius=FILLET2_R)


solid = part.part
